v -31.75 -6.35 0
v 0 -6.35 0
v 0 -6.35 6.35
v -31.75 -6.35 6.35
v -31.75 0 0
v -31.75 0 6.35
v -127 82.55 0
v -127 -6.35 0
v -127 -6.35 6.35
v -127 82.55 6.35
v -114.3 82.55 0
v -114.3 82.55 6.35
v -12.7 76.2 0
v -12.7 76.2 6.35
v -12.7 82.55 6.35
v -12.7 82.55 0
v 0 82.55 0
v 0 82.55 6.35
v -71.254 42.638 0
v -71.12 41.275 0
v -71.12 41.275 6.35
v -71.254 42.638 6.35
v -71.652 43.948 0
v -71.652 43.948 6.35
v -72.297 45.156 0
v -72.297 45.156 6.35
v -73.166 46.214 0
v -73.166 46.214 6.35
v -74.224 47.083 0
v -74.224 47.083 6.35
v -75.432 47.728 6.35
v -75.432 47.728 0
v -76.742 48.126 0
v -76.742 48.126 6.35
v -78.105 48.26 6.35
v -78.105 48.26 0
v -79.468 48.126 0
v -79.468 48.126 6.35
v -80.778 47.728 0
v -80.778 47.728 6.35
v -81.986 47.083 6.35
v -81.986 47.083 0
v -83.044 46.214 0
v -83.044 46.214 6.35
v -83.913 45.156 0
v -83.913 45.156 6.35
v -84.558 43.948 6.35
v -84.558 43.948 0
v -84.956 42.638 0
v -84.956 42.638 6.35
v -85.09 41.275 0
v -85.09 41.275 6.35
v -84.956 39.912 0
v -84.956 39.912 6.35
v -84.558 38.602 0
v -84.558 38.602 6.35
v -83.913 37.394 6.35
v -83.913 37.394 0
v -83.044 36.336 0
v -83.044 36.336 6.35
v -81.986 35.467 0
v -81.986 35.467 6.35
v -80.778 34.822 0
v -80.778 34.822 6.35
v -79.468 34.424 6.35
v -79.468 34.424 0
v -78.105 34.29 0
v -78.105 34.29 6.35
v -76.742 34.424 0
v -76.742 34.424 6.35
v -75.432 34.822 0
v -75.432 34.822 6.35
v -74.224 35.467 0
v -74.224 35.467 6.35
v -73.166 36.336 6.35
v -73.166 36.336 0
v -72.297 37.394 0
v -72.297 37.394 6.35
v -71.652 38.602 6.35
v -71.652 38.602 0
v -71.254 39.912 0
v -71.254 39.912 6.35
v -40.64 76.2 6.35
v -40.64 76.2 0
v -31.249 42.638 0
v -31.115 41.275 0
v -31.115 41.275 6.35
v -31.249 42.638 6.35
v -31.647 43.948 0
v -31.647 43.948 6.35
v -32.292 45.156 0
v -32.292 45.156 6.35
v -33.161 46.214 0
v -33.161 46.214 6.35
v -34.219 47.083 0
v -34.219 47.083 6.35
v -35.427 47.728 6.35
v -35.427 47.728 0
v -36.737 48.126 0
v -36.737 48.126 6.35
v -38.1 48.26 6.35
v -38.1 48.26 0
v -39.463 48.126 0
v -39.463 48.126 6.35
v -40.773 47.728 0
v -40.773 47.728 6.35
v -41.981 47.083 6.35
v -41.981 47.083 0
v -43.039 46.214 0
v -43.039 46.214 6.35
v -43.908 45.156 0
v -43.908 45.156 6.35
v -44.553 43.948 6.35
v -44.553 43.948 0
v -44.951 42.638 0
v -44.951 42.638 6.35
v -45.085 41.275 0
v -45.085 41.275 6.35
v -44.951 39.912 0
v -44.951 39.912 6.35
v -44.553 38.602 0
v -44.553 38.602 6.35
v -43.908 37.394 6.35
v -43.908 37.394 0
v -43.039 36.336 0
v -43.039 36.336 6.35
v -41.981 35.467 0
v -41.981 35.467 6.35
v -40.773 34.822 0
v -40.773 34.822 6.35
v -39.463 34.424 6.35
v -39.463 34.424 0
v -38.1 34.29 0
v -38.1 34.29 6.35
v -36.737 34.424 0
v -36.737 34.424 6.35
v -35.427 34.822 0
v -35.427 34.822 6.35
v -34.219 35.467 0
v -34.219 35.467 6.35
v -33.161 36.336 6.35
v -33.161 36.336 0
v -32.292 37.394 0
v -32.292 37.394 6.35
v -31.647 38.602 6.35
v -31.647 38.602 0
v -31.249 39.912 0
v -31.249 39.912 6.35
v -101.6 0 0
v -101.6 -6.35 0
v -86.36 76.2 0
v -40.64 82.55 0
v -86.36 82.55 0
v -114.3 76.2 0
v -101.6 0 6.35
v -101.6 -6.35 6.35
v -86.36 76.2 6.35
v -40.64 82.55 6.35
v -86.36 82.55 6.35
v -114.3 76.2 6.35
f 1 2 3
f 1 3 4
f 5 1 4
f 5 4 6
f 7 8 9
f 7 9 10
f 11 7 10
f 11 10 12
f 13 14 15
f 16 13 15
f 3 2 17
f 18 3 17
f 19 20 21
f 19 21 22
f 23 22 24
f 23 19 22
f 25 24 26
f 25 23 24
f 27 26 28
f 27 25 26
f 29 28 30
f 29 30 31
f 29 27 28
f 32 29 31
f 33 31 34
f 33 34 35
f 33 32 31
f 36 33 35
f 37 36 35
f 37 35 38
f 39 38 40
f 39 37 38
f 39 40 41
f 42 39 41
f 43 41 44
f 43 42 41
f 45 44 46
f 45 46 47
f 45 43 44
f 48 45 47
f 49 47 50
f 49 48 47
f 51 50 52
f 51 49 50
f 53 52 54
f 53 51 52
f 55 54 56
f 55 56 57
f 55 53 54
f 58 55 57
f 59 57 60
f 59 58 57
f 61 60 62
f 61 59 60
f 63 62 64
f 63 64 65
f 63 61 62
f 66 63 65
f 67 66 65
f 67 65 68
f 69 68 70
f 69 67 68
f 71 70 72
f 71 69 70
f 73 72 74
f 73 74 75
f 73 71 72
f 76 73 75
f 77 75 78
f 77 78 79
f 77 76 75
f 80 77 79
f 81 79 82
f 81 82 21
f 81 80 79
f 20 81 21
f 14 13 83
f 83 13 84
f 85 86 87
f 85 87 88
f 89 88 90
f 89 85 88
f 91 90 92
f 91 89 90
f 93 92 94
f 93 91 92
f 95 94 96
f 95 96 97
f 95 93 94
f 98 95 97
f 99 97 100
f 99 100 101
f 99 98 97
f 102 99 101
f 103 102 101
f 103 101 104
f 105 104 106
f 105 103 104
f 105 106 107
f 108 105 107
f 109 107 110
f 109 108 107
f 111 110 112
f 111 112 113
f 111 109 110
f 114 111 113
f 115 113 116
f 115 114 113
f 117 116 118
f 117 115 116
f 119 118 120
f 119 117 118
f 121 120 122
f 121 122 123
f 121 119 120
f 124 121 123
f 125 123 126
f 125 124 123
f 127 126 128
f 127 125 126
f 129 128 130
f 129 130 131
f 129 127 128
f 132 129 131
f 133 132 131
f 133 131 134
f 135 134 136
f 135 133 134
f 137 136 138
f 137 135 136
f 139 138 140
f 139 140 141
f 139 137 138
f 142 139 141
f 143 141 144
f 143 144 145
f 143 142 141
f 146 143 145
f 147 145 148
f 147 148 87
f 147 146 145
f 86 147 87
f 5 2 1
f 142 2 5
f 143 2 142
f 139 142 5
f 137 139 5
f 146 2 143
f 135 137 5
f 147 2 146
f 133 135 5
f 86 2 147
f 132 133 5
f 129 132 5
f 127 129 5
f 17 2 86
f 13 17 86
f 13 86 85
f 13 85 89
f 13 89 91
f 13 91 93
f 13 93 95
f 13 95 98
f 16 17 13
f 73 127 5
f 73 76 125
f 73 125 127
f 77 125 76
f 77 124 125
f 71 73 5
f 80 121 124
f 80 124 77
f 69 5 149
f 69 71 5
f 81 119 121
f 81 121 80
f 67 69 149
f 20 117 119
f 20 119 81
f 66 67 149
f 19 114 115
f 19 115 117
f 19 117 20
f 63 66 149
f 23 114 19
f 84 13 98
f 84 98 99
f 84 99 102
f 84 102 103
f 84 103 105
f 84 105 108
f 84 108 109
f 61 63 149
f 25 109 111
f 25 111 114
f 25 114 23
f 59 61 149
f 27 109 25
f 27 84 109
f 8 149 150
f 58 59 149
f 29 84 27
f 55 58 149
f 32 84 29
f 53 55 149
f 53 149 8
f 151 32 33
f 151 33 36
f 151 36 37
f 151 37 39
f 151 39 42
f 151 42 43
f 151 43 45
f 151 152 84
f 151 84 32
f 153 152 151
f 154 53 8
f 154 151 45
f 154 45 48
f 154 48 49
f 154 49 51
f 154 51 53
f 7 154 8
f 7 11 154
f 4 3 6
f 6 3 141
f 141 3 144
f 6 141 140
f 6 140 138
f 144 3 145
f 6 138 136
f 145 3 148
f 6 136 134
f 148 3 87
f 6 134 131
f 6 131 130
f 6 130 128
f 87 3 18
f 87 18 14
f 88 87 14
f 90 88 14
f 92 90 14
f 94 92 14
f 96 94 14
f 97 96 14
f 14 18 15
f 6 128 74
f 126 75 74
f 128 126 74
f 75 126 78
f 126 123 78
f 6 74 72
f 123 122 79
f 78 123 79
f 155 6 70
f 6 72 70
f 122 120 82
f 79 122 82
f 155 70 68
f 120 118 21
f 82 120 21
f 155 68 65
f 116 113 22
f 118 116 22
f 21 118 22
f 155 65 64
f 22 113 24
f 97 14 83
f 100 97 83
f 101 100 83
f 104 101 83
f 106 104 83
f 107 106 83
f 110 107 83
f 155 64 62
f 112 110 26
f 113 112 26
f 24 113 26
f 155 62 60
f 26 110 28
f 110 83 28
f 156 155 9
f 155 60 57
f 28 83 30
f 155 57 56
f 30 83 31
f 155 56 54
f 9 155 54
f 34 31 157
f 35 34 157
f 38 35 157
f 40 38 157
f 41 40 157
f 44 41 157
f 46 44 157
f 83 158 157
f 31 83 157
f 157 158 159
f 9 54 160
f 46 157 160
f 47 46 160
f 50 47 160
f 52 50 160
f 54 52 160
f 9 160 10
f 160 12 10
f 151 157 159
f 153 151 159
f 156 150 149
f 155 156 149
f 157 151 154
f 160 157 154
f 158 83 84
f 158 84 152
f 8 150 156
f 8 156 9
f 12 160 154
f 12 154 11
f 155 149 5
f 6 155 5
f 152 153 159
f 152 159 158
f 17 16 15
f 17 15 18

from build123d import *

# Parameters (mm, degrees)
SKETCH1_W           = 127
SKETCH1_H           = 82.55
SKETCH1_R           = 6.985
BOSS_EXTRUDE1_DEPTH = 6.35
SKETCH2_W           = 31.75
SKETCH2_H           = 6.35
SKETCH2_W_2         = 25.4
BOSS_EXTRUDE2_DEPTH = 6.35
SKETCH3_W           = 27.94
SKETCH3_H           = 6.35
CUT_EXTRUDE1_DEPTH  = 6.35


with BuildPart() as part:
    # Sketch1 → Boss-Extrude1 (new body)
    with BuildSketch(Plane.XY):
        with Locations((-63.5, 41.275)):
            Rectangle(SKETCH1_W, SKETCH1_H)
        with Locations((-38.1, 41.275)):
            Circle(SKETCH1_R, mode=Mode.SUBTRACT)
        with Locations((-78.105, 41.275)):
            Circle(SKETCH1_R, mode=Mode.SUBTRACT)
    extrude(amount=BOSS_EXTRUDE1_DEPTH)

    # Sketch2 → Boss-Extrude2 (add)
    with BuildSketch(Plane(origin=(0, 0, 0), x_dir=(-1, 0, 0), z_dir=(0, 0, -1))):
        with Locations((15.875, -3.175)):
            Rectangle(SKETCH2_W, SKETCH2_H)
        with Locations((114.3, -3.175)):
            Rectangle(SKETCH2_W_2, SKETCH2_H)
    extrude(amount=-BOSS_EXTRUDE2_DEPTH)

    # Sketch3 → Cut-Extrude1 (cut)
    with BuildSketch(Plane(origin=(0, 0, 0), x_dir=(-1, 0, 0), z_dir=(0, 0, -1))):
        with Locations((26.67, 79.375)):
            Rectangle(SKETCH3_W, SKETCH3_H)
        with Locations((100.33, 79.375)):
            Rectangle(SKETCH3_W, SKETCH3_H)
    extrude(amount=-CUT_EXTRUDE1_DEPTH, mode=Mode.SUBTRACT)


solid = part.part
